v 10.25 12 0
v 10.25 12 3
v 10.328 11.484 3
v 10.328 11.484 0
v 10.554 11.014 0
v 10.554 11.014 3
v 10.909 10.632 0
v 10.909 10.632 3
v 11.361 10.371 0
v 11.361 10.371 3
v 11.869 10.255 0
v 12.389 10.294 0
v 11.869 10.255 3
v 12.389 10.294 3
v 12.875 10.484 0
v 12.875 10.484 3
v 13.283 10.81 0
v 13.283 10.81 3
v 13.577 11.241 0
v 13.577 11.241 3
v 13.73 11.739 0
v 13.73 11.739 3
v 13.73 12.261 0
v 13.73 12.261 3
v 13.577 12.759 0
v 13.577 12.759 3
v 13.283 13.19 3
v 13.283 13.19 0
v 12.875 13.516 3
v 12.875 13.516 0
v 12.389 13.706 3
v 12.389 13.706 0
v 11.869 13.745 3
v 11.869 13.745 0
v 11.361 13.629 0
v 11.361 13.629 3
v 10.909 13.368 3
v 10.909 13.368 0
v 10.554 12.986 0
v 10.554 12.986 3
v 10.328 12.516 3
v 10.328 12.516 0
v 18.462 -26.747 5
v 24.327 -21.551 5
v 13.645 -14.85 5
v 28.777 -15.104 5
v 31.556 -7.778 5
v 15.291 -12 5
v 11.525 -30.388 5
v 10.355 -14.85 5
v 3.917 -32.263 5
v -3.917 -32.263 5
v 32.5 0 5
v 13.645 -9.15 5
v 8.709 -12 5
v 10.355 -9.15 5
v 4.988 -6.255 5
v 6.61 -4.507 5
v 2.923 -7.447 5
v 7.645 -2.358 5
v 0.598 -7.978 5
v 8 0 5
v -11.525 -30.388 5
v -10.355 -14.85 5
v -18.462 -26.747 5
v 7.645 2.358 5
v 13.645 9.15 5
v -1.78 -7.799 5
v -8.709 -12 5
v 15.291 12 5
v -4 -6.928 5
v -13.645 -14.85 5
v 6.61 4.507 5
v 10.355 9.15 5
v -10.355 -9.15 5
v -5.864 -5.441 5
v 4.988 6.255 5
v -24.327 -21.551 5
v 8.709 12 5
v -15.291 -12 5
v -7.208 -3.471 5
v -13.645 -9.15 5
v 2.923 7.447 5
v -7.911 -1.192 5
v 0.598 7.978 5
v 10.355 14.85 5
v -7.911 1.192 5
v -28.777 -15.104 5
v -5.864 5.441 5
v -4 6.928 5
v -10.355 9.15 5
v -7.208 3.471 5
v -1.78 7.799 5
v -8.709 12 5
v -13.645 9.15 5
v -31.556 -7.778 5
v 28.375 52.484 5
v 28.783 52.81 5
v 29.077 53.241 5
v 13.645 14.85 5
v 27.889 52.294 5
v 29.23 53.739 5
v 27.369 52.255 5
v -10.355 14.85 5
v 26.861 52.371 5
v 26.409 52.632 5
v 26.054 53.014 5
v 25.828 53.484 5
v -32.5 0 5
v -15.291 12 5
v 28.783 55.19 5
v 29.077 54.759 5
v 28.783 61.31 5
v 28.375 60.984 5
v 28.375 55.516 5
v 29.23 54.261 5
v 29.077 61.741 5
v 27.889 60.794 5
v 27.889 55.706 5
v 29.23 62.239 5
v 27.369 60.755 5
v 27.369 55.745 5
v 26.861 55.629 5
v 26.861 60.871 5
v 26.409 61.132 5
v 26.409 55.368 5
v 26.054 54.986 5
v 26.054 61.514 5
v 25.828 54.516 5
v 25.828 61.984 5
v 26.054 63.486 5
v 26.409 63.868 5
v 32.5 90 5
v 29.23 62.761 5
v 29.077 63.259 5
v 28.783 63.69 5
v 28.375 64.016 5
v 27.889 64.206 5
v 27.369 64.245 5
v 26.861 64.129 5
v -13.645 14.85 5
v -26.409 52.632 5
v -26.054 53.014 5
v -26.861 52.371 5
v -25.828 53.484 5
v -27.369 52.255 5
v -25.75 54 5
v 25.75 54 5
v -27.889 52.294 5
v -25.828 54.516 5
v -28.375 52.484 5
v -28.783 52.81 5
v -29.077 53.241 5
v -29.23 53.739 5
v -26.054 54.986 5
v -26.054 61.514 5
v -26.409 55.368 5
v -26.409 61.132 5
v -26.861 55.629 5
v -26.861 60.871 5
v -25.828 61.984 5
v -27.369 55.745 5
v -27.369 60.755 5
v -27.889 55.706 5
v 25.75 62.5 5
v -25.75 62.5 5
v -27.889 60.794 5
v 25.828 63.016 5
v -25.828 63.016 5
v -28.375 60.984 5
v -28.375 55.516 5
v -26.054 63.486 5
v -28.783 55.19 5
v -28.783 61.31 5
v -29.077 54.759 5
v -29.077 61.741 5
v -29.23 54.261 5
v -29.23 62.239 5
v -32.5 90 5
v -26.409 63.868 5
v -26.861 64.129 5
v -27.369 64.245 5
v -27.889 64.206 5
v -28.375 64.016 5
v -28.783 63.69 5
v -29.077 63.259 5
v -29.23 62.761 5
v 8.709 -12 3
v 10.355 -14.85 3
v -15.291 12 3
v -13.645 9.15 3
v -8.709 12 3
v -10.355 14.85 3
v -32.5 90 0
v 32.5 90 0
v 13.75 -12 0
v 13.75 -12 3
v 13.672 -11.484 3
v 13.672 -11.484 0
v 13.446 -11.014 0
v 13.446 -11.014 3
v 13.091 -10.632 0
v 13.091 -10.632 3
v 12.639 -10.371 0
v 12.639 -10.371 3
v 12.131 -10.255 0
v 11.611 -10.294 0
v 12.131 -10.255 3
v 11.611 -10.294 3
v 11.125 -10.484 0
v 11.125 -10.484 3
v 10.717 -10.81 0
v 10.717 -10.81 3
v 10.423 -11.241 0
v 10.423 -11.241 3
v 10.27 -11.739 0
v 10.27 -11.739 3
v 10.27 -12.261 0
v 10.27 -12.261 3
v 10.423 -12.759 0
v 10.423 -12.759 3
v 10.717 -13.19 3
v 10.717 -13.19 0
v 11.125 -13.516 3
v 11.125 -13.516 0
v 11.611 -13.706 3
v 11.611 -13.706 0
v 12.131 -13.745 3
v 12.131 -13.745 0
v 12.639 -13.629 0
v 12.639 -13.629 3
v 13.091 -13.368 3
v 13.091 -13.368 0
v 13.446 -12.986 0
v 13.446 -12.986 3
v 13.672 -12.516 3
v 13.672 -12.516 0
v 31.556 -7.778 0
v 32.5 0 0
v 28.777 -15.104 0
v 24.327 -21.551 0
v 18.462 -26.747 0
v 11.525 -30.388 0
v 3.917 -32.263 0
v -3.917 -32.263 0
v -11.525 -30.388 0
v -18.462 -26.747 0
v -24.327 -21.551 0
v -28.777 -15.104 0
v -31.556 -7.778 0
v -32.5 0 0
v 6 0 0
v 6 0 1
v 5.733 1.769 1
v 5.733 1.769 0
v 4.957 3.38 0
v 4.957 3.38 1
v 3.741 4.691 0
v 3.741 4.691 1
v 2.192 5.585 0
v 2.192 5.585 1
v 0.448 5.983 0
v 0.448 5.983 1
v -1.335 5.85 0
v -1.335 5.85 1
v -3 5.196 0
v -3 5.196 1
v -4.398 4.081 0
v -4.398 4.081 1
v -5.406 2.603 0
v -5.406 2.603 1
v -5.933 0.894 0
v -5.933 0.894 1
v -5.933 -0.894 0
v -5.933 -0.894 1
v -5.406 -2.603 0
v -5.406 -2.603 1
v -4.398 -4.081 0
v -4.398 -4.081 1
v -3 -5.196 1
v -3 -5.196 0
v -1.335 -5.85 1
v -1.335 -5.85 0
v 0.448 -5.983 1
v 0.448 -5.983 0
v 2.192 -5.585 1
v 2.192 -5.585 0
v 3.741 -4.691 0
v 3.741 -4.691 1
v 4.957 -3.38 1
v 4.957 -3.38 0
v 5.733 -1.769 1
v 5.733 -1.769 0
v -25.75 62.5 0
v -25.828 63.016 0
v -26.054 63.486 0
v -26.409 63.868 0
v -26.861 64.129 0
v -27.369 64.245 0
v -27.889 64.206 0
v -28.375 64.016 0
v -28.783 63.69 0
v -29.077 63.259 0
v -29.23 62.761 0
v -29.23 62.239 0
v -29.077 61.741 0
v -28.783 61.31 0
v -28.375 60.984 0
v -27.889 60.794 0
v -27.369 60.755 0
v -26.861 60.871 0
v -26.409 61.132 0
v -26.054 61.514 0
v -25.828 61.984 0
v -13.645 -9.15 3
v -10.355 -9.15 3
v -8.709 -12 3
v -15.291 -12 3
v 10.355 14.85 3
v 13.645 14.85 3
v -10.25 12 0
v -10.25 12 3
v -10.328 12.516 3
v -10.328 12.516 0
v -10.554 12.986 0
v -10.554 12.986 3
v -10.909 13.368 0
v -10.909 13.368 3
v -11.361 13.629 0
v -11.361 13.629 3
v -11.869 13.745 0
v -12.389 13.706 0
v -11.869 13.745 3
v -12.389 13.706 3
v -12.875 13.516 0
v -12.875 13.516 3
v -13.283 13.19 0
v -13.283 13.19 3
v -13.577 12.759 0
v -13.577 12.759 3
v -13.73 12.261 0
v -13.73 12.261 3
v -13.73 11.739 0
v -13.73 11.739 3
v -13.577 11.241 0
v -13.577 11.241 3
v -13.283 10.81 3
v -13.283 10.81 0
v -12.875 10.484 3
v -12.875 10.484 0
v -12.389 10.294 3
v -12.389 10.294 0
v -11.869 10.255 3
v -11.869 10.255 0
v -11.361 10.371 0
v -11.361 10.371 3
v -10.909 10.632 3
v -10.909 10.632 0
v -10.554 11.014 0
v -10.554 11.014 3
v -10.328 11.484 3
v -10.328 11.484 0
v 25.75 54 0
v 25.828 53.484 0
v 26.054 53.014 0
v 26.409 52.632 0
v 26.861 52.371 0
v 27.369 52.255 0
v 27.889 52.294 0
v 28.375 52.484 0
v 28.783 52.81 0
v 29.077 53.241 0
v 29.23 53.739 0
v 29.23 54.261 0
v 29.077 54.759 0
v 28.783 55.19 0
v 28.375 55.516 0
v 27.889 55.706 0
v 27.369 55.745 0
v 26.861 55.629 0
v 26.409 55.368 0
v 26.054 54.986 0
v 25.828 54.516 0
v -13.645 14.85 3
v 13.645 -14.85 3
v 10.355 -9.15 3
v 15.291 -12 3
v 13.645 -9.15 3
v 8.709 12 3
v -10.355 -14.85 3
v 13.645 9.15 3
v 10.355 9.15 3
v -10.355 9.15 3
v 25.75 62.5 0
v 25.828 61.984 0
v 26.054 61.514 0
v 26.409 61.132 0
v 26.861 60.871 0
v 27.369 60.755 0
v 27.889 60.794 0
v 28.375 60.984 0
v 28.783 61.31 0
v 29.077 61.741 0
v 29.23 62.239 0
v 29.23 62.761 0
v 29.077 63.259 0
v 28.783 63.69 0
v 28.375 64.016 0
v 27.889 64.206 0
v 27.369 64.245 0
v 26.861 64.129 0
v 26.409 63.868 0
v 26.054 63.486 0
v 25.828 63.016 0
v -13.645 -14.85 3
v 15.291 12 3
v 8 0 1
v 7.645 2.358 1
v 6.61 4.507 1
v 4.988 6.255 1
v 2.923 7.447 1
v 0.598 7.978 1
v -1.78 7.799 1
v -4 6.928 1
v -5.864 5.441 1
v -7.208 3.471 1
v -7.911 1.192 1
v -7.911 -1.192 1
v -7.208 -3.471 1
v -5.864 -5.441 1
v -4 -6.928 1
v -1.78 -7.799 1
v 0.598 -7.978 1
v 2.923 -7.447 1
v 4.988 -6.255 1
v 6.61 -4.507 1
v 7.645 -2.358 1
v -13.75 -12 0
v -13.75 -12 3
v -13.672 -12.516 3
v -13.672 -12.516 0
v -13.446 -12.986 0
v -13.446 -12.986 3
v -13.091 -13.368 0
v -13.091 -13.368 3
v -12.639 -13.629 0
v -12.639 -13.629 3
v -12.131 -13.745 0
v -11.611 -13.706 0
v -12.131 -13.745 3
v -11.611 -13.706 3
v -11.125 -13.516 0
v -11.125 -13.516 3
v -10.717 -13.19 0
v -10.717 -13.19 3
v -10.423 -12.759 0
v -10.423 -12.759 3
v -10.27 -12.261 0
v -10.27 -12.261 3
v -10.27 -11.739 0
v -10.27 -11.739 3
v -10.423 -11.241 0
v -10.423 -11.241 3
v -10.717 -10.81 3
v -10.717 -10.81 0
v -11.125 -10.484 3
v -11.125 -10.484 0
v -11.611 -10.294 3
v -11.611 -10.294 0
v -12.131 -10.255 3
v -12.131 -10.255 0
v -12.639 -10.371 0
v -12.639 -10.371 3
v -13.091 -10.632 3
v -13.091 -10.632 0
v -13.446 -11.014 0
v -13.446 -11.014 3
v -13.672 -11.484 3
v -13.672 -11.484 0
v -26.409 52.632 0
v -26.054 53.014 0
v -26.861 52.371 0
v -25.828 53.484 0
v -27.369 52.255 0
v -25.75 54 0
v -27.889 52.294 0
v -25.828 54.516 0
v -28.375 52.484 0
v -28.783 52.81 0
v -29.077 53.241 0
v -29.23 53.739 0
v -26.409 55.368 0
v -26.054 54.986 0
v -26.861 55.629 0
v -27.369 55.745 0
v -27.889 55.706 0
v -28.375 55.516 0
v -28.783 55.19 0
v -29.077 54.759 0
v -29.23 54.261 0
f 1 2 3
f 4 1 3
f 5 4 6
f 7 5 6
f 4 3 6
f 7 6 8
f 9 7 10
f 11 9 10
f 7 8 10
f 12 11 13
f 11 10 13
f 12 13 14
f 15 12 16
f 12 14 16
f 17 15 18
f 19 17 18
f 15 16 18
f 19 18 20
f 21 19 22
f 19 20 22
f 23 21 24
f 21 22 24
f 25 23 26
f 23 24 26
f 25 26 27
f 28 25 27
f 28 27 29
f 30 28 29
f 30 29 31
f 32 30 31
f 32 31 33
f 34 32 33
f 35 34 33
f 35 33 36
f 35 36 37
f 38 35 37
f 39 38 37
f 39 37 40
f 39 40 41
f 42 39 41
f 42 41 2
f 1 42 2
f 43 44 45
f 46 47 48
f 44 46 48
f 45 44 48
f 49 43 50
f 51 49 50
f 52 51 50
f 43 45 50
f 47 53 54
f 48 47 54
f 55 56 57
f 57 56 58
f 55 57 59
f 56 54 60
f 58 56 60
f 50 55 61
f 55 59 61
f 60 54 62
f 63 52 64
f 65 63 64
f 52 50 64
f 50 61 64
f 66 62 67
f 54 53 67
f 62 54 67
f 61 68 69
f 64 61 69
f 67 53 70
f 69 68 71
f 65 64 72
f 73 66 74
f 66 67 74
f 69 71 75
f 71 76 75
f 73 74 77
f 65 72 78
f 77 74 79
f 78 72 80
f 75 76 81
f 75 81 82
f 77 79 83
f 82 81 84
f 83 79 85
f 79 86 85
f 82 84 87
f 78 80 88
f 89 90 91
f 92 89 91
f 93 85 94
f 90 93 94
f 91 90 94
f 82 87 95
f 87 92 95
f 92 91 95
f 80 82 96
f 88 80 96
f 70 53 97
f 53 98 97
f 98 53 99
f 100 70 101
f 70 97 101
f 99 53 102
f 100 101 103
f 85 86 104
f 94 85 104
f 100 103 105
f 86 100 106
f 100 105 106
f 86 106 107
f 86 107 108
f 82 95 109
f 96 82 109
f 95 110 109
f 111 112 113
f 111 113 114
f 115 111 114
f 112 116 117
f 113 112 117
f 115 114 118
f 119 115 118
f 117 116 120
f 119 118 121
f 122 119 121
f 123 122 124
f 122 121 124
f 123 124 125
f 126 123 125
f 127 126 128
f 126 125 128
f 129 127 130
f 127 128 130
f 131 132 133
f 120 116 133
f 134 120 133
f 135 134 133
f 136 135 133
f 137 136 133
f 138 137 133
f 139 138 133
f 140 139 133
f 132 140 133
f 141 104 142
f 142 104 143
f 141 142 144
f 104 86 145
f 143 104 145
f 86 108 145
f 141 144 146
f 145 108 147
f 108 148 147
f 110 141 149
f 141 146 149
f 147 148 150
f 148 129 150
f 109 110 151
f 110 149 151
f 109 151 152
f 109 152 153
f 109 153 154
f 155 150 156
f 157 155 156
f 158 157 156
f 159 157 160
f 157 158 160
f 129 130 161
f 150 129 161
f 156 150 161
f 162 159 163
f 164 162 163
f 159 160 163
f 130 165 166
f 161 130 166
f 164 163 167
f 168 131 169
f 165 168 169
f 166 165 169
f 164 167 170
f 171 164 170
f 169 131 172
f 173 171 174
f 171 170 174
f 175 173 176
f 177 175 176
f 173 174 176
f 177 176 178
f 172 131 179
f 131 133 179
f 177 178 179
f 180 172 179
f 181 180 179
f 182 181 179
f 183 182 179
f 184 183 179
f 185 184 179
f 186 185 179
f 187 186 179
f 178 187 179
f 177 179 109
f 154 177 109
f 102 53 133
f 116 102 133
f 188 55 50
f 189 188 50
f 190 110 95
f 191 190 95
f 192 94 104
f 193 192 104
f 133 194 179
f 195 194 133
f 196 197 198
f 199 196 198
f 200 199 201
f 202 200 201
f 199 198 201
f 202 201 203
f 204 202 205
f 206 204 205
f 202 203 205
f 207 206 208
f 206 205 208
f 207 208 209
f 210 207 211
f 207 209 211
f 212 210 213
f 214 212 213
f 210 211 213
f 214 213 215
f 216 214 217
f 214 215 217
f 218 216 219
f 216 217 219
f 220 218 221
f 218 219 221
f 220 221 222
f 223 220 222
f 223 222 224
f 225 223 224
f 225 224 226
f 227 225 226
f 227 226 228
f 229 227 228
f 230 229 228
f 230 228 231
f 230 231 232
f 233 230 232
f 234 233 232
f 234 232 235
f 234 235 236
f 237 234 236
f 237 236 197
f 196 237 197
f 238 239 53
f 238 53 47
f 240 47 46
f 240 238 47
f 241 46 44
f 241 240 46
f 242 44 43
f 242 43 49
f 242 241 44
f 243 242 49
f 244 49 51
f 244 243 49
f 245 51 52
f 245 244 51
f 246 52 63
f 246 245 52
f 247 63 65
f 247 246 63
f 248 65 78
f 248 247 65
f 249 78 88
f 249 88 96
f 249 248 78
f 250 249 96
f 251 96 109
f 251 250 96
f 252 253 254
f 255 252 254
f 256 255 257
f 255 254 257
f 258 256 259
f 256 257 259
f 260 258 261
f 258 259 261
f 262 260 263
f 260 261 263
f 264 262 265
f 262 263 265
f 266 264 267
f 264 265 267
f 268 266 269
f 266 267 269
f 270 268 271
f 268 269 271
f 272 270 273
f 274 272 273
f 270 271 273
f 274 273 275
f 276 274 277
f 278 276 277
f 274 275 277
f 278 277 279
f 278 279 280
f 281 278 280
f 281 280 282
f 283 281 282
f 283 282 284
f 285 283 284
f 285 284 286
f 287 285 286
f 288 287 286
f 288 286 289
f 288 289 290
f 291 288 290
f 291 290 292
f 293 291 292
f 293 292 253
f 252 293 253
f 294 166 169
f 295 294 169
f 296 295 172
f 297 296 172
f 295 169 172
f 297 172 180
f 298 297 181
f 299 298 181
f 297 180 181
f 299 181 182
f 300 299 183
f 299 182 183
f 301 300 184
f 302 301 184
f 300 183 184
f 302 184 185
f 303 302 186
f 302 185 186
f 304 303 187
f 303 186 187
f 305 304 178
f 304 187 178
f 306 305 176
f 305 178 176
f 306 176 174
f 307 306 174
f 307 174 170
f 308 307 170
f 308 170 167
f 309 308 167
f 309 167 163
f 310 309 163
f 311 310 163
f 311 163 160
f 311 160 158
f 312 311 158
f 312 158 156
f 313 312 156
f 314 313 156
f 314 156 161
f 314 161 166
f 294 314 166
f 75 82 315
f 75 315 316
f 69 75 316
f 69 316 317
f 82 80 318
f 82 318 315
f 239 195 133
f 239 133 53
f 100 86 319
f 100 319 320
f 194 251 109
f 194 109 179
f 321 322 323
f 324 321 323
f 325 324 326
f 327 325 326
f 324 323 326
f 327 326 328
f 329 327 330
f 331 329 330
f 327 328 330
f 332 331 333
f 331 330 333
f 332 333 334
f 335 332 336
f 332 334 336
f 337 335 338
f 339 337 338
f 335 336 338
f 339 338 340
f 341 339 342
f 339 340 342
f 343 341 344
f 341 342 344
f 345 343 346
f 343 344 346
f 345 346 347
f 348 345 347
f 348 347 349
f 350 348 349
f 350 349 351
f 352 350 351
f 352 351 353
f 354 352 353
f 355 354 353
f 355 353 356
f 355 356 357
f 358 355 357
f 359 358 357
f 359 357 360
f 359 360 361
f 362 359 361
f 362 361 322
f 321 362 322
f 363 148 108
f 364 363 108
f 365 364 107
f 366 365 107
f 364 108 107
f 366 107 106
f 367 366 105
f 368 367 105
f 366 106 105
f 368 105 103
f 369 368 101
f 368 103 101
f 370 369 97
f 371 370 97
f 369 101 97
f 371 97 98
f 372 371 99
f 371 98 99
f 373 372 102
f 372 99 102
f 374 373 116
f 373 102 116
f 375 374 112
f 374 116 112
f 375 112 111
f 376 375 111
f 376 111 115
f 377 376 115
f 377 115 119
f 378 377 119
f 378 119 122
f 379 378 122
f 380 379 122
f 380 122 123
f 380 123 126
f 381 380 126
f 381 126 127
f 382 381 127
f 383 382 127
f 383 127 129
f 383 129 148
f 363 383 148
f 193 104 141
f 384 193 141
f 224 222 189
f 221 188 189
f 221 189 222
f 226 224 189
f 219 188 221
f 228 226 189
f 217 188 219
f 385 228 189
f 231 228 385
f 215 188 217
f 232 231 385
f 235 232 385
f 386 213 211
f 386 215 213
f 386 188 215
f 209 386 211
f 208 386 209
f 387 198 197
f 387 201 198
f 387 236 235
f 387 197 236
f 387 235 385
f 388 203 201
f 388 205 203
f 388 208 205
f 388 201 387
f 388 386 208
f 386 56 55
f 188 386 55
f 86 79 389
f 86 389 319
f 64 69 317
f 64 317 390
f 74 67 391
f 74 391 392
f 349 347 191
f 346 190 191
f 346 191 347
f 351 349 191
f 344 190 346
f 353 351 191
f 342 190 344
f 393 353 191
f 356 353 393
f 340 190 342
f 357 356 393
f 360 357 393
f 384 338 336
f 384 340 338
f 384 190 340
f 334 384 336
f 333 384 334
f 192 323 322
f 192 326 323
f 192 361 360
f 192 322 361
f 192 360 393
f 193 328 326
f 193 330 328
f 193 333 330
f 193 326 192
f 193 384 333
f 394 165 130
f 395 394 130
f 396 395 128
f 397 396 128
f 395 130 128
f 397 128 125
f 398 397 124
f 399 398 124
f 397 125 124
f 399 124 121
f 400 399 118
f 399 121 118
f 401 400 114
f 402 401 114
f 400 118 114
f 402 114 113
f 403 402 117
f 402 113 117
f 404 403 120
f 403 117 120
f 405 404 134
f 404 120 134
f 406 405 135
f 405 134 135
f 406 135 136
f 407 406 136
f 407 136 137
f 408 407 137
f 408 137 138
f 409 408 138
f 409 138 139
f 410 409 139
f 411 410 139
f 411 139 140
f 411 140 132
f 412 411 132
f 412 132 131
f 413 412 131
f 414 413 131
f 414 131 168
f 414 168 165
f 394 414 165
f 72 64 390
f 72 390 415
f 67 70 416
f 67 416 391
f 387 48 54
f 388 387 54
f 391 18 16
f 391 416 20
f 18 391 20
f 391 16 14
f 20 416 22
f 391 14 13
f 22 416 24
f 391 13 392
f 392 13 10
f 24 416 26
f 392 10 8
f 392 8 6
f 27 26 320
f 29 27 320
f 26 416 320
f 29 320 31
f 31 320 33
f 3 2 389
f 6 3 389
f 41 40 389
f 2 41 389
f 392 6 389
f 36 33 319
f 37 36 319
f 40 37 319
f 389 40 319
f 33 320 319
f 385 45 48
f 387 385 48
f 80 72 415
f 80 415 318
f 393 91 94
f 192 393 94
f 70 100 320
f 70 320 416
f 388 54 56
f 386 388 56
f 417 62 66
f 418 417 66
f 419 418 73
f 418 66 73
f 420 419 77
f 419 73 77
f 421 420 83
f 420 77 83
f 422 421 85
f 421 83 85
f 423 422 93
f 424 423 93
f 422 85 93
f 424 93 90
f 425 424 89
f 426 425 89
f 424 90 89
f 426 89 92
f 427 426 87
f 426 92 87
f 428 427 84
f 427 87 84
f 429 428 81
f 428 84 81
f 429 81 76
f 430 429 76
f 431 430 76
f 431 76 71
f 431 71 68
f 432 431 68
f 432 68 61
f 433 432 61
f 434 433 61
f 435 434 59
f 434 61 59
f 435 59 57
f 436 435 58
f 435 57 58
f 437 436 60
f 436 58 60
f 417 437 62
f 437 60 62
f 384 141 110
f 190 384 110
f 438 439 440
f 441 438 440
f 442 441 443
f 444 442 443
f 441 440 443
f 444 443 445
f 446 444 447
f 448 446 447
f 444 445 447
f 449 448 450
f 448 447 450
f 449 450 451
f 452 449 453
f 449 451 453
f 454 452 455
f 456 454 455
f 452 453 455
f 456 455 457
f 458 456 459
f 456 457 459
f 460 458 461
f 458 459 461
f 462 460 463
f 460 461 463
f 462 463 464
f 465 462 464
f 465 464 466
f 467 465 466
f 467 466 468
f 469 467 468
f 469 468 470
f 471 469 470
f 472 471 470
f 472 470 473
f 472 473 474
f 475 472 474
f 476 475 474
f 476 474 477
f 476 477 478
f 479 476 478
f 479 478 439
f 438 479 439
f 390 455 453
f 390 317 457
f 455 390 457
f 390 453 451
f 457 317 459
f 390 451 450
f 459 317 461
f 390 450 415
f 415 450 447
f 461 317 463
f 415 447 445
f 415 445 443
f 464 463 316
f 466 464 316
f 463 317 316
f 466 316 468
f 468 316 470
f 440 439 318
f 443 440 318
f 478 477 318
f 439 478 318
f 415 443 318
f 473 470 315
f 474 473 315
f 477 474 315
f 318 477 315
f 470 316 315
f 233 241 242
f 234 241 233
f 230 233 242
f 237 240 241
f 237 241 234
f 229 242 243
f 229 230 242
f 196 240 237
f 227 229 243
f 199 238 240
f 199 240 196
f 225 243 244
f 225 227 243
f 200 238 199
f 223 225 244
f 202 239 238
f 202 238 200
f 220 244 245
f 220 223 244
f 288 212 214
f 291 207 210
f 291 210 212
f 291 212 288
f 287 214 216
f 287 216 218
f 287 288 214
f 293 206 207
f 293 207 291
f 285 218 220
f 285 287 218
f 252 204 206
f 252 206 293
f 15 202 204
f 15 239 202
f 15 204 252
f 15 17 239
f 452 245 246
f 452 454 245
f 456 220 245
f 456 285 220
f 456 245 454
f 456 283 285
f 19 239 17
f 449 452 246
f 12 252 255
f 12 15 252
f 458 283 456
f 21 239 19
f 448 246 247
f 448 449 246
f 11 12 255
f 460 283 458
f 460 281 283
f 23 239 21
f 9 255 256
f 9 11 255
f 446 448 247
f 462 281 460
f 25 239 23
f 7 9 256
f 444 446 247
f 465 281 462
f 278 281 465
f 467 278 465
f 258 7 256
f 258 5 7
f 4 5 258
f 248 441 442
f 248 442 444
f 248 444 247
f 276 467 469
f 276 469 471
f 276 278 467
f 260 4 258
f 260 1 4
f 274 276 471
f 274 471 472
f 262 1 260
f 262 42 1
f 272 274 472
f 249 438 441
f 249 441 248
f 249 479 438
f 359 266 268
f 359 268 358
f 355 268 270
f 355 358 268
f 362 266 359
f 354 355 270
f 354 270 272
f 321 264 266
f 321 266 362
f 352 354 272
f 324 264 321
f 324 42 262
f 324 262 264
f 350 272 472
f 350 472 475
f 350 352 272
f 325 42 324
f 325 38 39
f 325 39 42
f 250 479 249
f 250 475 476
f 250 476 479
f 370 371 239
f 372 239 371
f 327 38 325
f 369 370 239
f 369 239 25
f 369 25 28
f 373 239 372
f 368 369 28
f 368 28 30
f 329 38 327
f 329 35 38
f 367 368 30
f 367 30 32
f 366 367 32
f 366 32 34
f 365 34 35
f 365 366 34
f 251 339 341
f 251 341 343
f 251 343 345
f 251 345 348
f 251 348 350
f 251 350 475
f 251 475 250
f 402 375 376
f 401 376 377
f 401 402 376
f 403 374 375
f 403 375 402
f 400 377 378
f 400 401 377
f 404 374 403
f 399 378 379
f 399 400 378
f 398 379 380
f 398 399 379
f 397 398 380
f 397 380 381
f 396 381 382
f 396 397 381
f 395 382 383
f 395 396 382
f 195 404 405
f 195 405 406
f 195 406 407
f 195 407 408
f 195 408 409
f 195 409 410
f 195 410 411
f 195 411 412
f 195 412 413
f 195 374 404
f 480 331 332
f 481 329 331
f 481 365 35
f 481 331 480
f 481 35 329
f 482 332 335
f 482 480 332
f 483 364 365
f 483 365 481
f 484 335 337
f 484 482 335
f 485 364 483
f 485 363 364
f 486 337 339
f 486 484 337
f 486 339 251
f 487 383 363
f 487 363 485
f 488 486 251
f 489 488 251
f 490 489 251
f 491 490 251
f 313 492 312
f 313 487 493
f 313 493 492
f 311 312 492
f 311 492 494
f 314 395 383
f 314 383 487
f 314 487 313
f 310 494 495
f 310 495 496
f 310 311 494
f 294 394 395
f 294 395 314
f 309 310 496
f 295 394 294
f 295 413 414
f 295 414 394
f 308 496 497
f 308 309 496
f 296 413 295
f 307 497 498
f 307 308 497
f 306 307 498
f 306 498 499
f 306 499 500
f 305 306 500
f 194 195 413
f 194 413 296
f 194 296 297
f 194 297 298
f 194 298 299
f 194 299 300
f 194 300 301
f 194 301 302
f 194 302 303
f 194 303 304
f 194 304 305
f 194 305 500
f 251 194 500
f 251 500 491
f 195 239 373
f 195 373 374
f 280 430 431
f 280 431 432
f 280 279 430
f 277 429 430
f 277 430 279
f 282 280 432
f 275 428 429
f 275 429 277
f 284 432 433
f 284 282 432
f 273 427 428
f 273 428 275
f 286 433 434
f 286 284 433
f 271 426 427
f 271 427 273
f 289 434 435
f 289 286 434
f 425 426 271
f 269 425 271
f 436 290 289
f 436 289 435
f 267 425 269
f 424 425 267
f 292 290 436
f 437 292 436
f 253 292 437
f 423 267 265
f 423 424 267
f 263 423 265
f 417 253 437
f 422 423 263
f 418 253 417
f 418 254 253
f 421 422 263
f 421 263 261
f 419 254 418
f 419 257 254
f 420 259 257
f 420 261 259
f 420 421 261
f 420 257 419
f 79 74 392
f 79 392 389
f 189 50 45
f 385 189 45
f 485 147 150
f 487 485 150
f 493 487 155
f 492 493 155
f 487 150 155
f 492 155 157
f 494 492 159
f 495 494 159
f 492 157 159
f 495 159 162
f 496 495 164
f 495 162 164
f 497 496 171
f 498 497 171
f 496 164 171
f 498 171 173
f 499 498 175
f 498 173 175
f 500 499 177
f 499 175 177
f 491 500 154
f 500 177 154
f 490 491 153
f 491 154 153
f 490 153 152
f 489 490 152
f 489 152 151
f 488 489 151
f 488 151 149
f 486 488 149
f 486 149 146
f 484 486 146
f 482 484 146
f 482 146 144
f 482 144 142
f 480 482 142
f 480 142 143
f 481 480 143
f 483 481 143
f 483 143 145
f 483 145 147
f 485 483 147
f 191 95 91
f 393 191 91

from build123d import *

# Parameters (mm, degrees)
BOSS_EXTRUDE1_DEPTH = 5
SKETCH2_R           = 6
CUT_EXTRUDE1_DEPTH  = 96.818839484
SKETCH3_R           = 8
CUT_EXTRUDE2_DEPTH  = 4
SKETCH4_R           = 1.75
CUT_EXTRUDE3_DEPTH  = 96.818839484
CUT_EXTRUDE4_DEPTH  = 2
SKETCH6_R           = 1.75
CUT_EXTRUDE5_DEPTH  = 96.818839484


with BuildPart() as part:
    # Sketch1 → Boss-Extrude1 (new body)
    with BuildSketch(Plane.XY):
        with BuildLine():
            Line((-32.5, 0), (-32.5, 90))
            Line((-32.5, 90), (32.5, 90))
            Line((32.5, 90), (32.5, 0))
            ThreePointArc((32.5, 0), (0, -32.5), (-32.5, 0))
        make_face()
    extrude(amount=BOSS_EXTRUDE1_DEPTH)

    # Sketch2 → Cut-Extrude1 (cut, through all)
    with BuildSketch(Plane.XY.offset(5)):
        Circle(SKETCH2_R)
    extrude(amount=-CUT_EXTRUDE1_DEPTH, mode=Mode.SUBTRACT)

    # Sketch3 → Cut-Extrude2 (cut)
    with BuildSketch(Plane.XY.offset(5)):
        Circle(SKETCH3_R)
    extrude(amount=-CUT_EXTRUDE2_DEPTH, mode=Mode.SUBTRACT)

    # Sketch4 → Cut-Extrude3 (cut, through all)
    with BuildSketch(Plane.XY.offset(5)):
        with Locations((-12, 12)):
            Circle(SKETCH4_R)
        with Locations(Location((12, 12, 0), (0, 0, 180))):
            Circle(SKETCH4_R)
        with Locations((12, -12)):
            Circle(SKETCH4_R)
        with Locations(Location((-12, -12, 0), (0, 0, 180))):
            Circle(SKETCH4_R)
    extrude(amount=-CUT_EXTRUDE3_DEPTH, mode=Mode.SUBTRACT)

    # Sketch5 → Cut-Extrude4 (cut)
    with BuildSketch(Plane.XY.offset(5)):
        Polygon((-8.709103466, 12), (-10.354551733, 14.85), (-13.645448267, 14.85), (-15.290896534, 12), (-13.645448267, 9.15), (-10.354551733, 9.15), align=None)
        Polygon((10.354551733, 9.15), (8.709103466, 12), (10.354551733, 14.85), (13.645448267, 14.85), (15.290896534, 12), (13.645448267, 9.15), align=None)
        Polygon((8.709103466, -12), (10.354551733, -14.85), (13.645448267, -14.85), (15.290896534, -12), (13.645448267, -9.15), (10.354551733, -9.15), align=None)
        Polygon((-10.354551733, -9.15), (-8.709103466, -12), (-10.354551733, -14.85), (-13.645448267, -14.85), (-15.290896534, -12), (-13.645448267, -9.15), align=None)
    extrude(amount=-CUT_EXTRUDE4_DEPTH, mode=Mode.SUBTRACT)

    # Sketch6 → Cut-Extrude5 (cut, through all)
    with BuildSketch(Plane.XY.offset(5)):
        with Locations((-27.5, 62.5)):
            Circle(SKETCH6_R)
        with Locations((-27.5, 54)):
            Circle(SKETCH6_R)
        with Locations(Location((27.5, 54, 0), (0, 0, 180))):
            Circle(SKETCH6_R)
        with Locations(Location((27.5, 62.5, 0), (0, 0, 180))):
            Circle(SKETCH6_R)
    extrude(amount=-CUT_EXTRUDE5_DEPTH, mode=Mode.SUBTRACT)


solid = part.part
